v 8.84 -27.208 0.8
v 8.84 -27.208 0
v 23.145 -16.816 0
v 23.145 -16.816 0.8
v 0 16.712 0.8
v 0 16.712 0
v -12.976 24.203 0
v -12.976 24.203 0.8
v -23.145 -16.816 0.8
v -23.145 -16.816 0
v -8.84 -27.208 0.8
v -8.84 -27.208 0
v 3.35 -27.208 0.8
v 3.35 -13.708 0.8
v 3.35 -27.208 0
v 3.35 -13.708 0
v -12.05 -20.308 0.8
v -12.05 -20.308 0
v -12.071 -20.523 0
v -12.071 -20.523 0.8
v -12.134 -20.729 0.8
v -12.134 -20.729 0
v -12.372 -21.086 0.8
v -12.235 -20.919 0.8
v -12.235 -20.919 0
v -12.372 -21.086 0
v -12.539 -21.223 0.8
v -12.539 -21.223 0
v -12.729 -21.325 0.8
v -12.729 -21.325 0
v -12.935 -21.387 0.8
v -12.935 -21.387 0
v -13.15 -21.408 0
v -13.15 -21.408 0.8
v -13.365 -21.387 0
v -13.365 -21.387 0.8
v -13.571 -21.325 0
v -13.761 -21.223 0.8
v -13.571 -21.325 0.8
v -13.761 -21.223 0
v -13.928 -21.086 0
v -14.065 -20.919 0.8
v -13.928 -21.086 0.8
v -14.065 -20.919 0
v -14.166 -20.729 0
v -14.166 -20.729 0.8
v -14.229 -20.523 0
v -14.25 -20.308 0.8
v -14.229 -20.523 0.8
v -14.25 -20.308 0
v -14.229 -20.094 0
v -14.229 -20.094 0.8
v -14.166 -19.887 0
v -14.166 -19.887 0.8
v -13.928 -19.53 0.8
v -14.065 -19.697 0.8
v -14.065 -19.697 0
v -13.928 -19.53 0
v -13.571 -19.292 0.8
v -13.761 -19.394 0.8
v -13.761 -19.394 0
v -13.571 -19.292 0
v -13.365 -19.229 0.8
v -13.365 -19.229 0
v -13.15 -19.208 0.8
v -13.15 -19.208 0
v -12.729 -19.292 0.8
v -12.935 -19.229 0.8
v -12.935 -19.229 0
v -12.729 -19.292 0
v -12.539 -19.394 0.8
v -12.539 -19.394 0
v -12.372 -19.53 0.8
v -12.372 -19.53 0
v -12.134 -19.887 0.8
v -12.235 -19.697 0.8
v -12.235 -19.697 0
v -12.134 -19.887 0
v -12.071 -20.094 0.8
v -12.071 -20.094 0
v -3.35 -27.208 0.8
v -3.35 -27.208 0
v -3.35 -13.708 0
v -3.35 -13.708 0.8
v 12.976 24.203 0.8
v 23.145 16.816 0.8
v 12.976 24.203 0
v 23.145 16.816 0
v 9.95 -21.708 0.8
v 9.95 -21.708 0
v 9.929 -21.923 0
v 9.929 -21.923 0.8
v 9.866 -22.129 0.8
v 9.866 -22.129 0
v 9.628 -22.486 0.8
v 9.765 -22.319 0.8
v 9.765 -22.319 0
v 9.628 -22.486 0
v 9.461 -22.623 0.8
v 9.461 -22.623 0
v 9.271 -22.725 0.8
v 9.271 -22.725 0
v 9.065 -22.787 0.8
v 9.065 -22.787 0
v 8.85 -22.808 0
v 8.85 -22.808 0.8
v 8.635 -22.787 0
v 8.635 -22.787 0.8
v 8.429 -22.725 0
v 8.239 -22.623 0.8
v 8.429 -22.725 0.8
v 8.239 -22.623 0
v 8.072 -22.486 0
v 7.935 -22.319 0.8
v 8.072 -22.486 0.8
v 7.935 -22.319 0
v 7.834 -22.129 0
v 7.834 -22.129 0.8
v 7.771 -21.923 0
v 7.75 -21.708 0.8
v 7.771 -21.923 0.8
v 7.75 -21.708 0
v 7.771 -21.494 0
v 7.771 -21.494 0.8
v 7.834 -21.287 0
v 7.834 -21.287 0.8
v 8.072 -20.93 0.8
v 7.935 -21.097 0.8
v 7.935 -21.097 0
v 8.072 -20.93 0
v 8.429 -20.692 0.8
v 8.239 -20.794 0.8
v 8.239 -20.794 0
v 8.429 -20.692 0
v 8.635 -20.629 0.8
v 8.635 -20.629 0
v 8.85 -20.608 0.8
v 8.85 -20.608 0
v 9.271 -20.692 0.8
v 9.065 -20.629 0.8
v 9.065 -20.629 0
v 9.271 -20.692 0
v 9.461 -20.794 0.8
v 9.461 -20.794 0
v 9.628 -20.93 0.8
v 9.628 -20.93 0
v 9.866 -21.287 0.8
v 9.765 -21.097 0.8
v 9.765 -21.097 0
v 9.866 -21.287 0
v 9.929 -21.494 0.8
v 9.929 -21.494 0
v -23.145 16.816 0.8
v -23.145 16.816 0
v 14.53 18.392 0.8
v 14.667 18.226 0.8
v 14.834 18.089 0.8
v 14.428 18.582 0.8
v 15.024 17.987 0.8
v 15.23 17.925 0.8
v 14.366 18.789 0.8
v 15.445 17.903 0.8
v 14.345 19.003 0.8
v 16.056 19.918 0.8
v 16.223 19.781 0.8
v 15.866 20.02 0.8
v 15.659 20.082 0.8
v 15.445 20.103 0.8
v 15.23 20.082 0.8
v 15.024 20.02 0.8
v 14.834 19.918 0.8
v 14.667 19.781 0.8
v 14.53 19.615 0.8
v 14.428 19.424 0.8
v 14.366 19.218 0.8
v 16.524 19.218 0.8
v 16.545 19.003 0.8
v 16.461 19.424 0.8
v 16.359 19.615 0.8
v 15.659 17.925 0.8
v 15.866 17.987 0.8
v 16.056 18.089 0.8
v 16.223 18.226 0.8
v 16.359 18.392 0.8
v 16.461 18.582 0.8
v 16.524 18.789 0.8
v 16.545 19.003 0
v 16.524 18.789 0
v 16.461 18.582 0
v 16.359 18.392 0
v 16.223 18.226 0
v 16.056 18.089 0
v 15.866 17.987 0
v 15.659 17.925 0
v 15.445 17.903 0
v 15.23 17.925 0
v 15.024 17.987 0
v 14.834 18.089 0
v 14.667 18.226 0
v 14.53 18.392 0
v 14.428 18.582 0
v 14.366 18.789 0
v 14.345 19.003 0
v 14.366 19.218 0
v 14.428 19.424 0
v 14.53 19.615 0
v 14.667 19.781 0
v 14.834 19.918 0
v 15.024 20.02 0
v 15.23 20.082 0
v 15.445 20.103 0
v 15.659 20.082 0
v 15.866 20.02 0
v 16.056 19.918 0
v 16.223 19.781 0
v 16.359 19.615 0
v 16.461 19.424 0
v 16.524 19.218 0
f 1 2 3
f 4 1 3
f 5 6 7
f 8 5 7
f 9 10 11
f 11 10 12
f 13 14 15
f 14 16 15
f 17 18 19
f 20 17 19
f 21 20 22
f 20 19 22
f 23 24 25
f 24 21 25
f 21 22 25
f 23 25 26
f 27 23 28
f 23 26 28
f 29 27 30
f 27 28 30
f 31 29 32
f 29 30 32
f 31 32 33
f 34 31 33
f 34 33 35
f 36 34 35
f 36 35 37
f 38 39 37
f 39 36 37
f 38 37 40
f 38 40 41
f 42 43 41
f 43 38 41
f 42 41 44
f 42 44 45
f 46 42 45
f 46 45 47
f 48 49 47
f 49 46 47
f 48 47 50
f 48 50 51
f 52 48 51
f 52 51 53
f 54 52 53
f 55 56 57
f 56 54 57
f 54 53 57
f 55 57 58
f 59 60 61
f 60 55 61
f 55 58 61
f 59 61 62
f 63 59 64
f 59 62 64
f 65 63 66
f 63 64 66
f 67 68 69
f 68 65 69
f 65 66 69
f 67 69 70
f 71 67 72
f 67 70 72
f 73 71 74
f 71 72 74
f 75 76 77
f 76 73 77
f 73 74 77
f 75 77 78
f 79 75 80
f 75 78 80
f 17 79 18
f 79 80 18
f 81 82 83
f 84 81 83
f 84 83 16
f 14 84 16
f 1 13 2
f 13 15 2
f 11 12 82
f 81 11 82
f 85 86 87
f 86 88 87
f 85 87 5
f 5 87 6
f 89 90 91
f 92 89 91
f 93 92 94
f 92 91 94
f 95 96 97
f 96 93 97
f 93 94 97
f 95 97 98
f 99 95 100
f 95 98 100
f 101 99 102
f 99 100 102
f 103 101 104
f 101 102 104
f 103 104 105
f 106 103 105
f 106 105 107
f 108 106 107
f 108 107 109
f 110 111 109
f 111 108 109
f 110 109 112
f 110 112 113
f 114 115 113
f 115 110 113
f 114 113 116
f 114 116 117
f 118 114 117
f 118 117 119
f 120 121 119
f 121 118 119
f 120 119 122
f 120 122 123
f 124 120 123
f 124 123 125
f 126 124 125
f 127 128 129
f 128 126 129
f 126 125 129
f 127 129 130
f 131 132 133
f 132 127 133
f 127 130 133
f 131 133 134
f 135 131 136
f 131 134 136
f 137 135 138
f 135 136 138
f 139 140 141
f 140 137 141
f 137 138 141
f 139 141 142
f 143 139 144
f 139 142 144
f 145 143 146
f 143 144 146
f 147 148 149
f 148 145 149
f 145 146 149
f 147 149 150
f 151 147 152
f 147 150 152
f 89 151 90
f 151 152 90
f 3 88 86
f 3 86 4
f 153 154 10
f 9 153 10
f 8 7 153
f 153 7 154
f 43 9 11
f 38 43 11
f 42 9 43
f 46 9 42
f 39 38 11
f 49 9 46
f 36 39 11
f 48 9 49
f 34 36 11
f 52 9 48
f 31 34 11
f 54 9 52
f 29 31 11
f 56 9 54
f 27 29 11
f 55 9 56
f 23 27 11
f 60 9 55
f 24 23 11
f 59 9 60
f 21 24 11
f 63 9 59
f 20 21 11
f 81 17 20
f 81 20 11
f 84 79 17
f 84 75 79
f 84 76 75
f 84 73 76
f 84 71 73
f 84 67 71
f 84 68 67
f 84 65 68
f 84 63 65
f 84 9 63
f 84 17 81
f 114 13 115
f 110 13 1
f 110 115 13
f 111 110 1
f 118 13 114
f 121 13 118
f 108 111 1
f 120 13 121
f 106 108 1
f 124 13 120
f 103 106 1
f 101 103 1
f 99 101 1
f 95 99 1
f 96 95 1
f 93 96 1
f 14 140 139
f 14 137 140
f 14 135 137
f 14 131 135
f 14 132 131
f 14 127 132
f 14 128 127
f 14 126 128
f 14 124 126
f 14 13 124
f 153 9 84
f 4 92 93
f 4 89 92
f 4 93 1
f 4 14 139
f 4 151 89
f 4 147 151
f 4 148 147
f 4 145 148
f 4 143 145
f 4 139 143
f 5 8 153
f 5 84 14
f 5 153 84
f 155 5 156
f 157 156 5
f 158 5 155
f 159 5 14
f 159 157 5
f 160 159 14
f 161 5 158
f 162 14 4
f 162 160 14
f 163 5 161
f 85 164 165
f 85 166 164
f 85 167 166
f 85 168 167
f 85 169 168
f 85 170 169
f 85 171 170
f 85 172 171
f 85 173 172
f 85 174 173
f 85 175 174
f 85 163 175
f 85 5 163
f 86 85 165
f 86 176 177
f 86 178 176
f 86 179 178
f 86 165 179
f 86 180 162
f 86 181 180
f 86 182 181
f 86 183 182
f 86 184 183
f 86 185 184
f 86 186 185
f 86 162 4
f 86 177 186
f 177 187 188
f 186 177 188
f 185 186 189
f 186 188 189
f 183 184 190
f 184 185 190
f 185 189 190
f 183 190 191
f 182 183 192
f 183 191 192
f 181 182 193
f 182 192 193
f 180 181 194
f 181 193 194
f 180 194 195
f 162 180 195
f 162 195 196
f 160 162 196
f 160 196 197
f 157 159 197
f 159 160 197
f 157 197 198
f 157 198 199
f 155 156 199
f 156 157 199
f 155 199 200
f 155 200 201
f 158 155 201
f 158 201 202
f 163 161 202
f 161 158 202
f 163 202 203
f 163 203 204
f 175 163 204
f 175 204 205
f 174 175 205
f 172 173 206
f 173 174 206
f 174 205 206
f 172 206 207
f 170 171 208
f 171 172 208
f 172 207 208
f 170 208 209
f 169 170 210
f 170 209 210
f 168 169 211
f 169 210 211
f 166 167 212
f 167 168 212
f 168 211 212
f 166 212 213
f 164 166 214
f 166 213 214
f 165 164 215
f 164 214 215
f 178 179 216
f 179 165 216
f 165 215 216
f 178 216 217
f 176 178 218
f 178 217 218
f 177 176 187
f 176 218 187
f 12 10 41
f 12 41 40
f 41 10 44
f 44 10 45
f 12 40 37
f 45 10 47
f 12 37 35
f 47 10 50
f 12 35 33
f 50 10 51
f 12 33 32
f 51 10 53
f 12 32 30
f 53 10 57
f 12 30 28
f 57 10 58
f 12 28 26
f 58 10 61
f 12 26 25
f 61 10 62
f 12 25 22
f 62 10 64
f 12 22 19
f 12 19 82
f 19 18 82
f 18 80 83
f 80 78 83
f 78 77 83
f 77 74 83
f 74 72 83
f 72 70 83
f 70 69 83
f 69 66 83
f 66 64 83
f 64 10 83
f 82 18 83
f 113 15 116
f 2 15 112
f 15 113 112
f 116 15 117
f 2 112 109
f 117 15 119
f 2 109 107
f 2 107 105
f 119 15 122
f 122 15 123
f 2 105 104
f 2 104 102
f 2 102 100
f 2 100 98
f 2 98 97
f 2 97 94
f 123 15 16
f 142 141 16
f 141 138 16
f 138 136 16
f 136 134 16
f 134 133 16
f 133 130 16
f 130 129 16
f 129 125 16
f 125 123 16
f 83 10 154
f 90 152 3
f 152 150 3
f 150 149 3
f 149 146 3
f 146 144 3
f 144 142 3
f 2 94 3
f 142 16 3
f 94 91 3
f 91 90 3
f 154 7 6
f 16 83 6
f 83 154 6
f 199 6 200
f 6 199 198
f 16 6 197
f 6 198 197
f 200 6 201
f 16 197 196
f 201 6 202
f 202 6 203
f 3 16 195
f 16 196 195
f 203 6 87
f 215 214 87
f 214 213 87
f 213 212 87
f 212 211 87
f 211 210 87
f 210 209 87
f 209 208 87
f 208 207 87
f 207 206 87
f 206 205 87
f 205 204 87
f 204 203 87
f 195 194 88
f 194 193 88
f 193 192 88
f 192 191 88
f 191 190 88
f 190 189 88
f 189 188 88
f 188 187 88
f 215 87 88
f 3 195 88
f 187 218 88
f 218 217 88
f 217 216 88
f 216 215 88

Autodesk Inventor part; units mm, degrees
ref_plane "YZ Plane" through (0, 0, 0) normal (1, 0, 0) x (0, 1, 0)
ref_plane "XZ Plane" through (0, 0, 0) normal (0, 1, 0) x (-1, 0, 0)
ref_plane "XY Plane" through (0, 0, 0) normal (0, 0, 1) x (1, 0, 0)
sketch "Sketch1" plane through (0, 0, 0) normal (0, 0, 1) x (1, 0, 0)
  line L0 (9.734, 29.9583) -> (25.484, 18.5152)
  line L1 (25.484, 18.5152) -> (31.5, 0)
  line L2 (31.5, 0) -> (25.484, -18.5152)
  line L3 (25.484, -18.5152) -> (9.734, -29.9583)
  line L4 (9.734, -29.9583) -> (-9.734, -29.9583)
  line L5 (-9.734, -29.9583) -> (-25.484, -18.5152)
  line L6 (-25.484, -18.5152) -> (-31.5, 0)
  line L7 (-31.5, 0) -> (-25.484, 18.5152)
  line L8 (-25.484, 18.5152) -> (-9.734, 29.9583)
  line L9 (-9.734, 29.9583) -> (9.734, 29.9583)
  line L10 (0, 29.9583) -> (0, 0)
  line L11 (-13.8564, 26.9632) -> (0, 18.9632)
  line L12 (0, 18.9632) -> (13.8564, 26.9632)
  line L13 (-23.3574, 16.9702) -> (-28.8713, 0)
  line L14 (-28.8713, 0) -> (-23.3574, -16.9702)
  line L15 (-23.3574, -16.9702) -> (-8.9217, -27.4583)
  line L16 (-8.9217, -27.4583) -> (8.9217, -27.4583)
  line L17 (8.9217, -27.4583) -> (23.3574, -16.9702)
  line L18 (23.3574, -16.9702) -> (28.8713, 0)
  line L19 (28.8713, 0) -> (23.3574, 16.9702)
  line L20 (8.9217, 27.4583) -> (-8.9217, 27.4583)
  line L21 (-8.9217, 27.4583) -> (-11.4864, 25.5949)
  line L22 (-12.9919, 24.5011) -> (-23.3574, 16.9702)
  line L23 (-12.9919, 24.5011) -> (0, 17.0002)
  line L24 (23.3574, 16.9702) -> (12.9919, 24.5011)
  line L25 (11.4864, 25.5949) -> (8.9217, 27.4583)
  line L26 (0, 17.0002) -> (12.9919, 24.5011)
  line L27 (0, 16.7115) -> (-12.9763, 24.2034)
  line L28 (-12.9763, 24.2034) -> (-23.1447, 16.8156)
  line L29 (-23.1447, -16.8156) -> (-8.8405, -27.2083)
  line L30 (8.8405, -27.2083) -> (23.1447, -16.8156)
  line L31 (23.1447, 16.8156) -> (12.9763, 24.2034)
  line L32 (12.9763, 24.2034) -> (0, 16.7115)
  line L33 (-23.1447, 16.8156) -> (-23.1447, -16.8156)
  line L34 (23.1447, 16.8156) -> (23.1447, -16.8156)
  line L35 (-3.35, -27.2083) -> (-3.35, -13.7083)
  line L36 (-3.35, -13.7083) -> (3.35, -13.7083)
  line L37 (3.35, -13.7083) -> (3.35, -27.2083)
  line L38 (-8.8405, -27.2083) -> (-3.35, -27.2083)
  line L39 (3.35, -27.2083) -> (8.8405, -27.2083)
  circle A0 centre (15.4447, 19.0034) radius 3
  circle A1 centre (15.4447, 19.0034) radius 1.1
  circle A2 centre (-13.15, -20.3083) radius 3
  circle A3 centre (-13.15, -20.3083) radius 1.1
  circle A4 centre (8.85, -21.7083) radius 3
  circle A5 centre (8.85, -21.7083) radius 1.1
  circle A6 centre (15.4447, 19.0034) radius 2
  circle A7 centre (-13.15, -20.3083) radius 2
  circle A8 centre (8.85, -21.7083) radius 2
  dimension "d0" = 63
  dimension "d1" = 16
  dimension "d4" = 120
  dimension "d6" = 2.5
  dimension "d7" = 1.7
  dimension "d8" = 0.25
  dimension "d11" = 6.7
  dimension "d12" = 13.5
  dimension "d13" = 0.25
  dimension "d15" = 0.25
  dimension "d16" = 0.25
  dimension "d24" = 6
  dimension "d25" = 2.2
  dimension "d26" = 6
  dimension "d27" = 2.2
  dimension "d28" = 6
  dimension "d29" = 2.2
  dimension "d30" = 5.5
  dimension "d31" = 5.5
  dimension "d32" = 9.8
  dimension "d33" = 6.9
  dimension "d36" = 5.2
  dimension "d37" = 7.7
  dimension "d38" = 4
  dimension "d39" = 4
  dimension "d40" = 4
extrude "Extrusion1" add sketch "Sketch1" along normal blind 0.8 contours L32 L31 A0 L34 L30 L39 L37 L36 L35 L38 L29 L33 L28 L27 | L31 A0 | A2 | A4 | A6 | A7 | A8 picked at (16.9034, 21.0385)
properties part number "PCB" material "FR4"
